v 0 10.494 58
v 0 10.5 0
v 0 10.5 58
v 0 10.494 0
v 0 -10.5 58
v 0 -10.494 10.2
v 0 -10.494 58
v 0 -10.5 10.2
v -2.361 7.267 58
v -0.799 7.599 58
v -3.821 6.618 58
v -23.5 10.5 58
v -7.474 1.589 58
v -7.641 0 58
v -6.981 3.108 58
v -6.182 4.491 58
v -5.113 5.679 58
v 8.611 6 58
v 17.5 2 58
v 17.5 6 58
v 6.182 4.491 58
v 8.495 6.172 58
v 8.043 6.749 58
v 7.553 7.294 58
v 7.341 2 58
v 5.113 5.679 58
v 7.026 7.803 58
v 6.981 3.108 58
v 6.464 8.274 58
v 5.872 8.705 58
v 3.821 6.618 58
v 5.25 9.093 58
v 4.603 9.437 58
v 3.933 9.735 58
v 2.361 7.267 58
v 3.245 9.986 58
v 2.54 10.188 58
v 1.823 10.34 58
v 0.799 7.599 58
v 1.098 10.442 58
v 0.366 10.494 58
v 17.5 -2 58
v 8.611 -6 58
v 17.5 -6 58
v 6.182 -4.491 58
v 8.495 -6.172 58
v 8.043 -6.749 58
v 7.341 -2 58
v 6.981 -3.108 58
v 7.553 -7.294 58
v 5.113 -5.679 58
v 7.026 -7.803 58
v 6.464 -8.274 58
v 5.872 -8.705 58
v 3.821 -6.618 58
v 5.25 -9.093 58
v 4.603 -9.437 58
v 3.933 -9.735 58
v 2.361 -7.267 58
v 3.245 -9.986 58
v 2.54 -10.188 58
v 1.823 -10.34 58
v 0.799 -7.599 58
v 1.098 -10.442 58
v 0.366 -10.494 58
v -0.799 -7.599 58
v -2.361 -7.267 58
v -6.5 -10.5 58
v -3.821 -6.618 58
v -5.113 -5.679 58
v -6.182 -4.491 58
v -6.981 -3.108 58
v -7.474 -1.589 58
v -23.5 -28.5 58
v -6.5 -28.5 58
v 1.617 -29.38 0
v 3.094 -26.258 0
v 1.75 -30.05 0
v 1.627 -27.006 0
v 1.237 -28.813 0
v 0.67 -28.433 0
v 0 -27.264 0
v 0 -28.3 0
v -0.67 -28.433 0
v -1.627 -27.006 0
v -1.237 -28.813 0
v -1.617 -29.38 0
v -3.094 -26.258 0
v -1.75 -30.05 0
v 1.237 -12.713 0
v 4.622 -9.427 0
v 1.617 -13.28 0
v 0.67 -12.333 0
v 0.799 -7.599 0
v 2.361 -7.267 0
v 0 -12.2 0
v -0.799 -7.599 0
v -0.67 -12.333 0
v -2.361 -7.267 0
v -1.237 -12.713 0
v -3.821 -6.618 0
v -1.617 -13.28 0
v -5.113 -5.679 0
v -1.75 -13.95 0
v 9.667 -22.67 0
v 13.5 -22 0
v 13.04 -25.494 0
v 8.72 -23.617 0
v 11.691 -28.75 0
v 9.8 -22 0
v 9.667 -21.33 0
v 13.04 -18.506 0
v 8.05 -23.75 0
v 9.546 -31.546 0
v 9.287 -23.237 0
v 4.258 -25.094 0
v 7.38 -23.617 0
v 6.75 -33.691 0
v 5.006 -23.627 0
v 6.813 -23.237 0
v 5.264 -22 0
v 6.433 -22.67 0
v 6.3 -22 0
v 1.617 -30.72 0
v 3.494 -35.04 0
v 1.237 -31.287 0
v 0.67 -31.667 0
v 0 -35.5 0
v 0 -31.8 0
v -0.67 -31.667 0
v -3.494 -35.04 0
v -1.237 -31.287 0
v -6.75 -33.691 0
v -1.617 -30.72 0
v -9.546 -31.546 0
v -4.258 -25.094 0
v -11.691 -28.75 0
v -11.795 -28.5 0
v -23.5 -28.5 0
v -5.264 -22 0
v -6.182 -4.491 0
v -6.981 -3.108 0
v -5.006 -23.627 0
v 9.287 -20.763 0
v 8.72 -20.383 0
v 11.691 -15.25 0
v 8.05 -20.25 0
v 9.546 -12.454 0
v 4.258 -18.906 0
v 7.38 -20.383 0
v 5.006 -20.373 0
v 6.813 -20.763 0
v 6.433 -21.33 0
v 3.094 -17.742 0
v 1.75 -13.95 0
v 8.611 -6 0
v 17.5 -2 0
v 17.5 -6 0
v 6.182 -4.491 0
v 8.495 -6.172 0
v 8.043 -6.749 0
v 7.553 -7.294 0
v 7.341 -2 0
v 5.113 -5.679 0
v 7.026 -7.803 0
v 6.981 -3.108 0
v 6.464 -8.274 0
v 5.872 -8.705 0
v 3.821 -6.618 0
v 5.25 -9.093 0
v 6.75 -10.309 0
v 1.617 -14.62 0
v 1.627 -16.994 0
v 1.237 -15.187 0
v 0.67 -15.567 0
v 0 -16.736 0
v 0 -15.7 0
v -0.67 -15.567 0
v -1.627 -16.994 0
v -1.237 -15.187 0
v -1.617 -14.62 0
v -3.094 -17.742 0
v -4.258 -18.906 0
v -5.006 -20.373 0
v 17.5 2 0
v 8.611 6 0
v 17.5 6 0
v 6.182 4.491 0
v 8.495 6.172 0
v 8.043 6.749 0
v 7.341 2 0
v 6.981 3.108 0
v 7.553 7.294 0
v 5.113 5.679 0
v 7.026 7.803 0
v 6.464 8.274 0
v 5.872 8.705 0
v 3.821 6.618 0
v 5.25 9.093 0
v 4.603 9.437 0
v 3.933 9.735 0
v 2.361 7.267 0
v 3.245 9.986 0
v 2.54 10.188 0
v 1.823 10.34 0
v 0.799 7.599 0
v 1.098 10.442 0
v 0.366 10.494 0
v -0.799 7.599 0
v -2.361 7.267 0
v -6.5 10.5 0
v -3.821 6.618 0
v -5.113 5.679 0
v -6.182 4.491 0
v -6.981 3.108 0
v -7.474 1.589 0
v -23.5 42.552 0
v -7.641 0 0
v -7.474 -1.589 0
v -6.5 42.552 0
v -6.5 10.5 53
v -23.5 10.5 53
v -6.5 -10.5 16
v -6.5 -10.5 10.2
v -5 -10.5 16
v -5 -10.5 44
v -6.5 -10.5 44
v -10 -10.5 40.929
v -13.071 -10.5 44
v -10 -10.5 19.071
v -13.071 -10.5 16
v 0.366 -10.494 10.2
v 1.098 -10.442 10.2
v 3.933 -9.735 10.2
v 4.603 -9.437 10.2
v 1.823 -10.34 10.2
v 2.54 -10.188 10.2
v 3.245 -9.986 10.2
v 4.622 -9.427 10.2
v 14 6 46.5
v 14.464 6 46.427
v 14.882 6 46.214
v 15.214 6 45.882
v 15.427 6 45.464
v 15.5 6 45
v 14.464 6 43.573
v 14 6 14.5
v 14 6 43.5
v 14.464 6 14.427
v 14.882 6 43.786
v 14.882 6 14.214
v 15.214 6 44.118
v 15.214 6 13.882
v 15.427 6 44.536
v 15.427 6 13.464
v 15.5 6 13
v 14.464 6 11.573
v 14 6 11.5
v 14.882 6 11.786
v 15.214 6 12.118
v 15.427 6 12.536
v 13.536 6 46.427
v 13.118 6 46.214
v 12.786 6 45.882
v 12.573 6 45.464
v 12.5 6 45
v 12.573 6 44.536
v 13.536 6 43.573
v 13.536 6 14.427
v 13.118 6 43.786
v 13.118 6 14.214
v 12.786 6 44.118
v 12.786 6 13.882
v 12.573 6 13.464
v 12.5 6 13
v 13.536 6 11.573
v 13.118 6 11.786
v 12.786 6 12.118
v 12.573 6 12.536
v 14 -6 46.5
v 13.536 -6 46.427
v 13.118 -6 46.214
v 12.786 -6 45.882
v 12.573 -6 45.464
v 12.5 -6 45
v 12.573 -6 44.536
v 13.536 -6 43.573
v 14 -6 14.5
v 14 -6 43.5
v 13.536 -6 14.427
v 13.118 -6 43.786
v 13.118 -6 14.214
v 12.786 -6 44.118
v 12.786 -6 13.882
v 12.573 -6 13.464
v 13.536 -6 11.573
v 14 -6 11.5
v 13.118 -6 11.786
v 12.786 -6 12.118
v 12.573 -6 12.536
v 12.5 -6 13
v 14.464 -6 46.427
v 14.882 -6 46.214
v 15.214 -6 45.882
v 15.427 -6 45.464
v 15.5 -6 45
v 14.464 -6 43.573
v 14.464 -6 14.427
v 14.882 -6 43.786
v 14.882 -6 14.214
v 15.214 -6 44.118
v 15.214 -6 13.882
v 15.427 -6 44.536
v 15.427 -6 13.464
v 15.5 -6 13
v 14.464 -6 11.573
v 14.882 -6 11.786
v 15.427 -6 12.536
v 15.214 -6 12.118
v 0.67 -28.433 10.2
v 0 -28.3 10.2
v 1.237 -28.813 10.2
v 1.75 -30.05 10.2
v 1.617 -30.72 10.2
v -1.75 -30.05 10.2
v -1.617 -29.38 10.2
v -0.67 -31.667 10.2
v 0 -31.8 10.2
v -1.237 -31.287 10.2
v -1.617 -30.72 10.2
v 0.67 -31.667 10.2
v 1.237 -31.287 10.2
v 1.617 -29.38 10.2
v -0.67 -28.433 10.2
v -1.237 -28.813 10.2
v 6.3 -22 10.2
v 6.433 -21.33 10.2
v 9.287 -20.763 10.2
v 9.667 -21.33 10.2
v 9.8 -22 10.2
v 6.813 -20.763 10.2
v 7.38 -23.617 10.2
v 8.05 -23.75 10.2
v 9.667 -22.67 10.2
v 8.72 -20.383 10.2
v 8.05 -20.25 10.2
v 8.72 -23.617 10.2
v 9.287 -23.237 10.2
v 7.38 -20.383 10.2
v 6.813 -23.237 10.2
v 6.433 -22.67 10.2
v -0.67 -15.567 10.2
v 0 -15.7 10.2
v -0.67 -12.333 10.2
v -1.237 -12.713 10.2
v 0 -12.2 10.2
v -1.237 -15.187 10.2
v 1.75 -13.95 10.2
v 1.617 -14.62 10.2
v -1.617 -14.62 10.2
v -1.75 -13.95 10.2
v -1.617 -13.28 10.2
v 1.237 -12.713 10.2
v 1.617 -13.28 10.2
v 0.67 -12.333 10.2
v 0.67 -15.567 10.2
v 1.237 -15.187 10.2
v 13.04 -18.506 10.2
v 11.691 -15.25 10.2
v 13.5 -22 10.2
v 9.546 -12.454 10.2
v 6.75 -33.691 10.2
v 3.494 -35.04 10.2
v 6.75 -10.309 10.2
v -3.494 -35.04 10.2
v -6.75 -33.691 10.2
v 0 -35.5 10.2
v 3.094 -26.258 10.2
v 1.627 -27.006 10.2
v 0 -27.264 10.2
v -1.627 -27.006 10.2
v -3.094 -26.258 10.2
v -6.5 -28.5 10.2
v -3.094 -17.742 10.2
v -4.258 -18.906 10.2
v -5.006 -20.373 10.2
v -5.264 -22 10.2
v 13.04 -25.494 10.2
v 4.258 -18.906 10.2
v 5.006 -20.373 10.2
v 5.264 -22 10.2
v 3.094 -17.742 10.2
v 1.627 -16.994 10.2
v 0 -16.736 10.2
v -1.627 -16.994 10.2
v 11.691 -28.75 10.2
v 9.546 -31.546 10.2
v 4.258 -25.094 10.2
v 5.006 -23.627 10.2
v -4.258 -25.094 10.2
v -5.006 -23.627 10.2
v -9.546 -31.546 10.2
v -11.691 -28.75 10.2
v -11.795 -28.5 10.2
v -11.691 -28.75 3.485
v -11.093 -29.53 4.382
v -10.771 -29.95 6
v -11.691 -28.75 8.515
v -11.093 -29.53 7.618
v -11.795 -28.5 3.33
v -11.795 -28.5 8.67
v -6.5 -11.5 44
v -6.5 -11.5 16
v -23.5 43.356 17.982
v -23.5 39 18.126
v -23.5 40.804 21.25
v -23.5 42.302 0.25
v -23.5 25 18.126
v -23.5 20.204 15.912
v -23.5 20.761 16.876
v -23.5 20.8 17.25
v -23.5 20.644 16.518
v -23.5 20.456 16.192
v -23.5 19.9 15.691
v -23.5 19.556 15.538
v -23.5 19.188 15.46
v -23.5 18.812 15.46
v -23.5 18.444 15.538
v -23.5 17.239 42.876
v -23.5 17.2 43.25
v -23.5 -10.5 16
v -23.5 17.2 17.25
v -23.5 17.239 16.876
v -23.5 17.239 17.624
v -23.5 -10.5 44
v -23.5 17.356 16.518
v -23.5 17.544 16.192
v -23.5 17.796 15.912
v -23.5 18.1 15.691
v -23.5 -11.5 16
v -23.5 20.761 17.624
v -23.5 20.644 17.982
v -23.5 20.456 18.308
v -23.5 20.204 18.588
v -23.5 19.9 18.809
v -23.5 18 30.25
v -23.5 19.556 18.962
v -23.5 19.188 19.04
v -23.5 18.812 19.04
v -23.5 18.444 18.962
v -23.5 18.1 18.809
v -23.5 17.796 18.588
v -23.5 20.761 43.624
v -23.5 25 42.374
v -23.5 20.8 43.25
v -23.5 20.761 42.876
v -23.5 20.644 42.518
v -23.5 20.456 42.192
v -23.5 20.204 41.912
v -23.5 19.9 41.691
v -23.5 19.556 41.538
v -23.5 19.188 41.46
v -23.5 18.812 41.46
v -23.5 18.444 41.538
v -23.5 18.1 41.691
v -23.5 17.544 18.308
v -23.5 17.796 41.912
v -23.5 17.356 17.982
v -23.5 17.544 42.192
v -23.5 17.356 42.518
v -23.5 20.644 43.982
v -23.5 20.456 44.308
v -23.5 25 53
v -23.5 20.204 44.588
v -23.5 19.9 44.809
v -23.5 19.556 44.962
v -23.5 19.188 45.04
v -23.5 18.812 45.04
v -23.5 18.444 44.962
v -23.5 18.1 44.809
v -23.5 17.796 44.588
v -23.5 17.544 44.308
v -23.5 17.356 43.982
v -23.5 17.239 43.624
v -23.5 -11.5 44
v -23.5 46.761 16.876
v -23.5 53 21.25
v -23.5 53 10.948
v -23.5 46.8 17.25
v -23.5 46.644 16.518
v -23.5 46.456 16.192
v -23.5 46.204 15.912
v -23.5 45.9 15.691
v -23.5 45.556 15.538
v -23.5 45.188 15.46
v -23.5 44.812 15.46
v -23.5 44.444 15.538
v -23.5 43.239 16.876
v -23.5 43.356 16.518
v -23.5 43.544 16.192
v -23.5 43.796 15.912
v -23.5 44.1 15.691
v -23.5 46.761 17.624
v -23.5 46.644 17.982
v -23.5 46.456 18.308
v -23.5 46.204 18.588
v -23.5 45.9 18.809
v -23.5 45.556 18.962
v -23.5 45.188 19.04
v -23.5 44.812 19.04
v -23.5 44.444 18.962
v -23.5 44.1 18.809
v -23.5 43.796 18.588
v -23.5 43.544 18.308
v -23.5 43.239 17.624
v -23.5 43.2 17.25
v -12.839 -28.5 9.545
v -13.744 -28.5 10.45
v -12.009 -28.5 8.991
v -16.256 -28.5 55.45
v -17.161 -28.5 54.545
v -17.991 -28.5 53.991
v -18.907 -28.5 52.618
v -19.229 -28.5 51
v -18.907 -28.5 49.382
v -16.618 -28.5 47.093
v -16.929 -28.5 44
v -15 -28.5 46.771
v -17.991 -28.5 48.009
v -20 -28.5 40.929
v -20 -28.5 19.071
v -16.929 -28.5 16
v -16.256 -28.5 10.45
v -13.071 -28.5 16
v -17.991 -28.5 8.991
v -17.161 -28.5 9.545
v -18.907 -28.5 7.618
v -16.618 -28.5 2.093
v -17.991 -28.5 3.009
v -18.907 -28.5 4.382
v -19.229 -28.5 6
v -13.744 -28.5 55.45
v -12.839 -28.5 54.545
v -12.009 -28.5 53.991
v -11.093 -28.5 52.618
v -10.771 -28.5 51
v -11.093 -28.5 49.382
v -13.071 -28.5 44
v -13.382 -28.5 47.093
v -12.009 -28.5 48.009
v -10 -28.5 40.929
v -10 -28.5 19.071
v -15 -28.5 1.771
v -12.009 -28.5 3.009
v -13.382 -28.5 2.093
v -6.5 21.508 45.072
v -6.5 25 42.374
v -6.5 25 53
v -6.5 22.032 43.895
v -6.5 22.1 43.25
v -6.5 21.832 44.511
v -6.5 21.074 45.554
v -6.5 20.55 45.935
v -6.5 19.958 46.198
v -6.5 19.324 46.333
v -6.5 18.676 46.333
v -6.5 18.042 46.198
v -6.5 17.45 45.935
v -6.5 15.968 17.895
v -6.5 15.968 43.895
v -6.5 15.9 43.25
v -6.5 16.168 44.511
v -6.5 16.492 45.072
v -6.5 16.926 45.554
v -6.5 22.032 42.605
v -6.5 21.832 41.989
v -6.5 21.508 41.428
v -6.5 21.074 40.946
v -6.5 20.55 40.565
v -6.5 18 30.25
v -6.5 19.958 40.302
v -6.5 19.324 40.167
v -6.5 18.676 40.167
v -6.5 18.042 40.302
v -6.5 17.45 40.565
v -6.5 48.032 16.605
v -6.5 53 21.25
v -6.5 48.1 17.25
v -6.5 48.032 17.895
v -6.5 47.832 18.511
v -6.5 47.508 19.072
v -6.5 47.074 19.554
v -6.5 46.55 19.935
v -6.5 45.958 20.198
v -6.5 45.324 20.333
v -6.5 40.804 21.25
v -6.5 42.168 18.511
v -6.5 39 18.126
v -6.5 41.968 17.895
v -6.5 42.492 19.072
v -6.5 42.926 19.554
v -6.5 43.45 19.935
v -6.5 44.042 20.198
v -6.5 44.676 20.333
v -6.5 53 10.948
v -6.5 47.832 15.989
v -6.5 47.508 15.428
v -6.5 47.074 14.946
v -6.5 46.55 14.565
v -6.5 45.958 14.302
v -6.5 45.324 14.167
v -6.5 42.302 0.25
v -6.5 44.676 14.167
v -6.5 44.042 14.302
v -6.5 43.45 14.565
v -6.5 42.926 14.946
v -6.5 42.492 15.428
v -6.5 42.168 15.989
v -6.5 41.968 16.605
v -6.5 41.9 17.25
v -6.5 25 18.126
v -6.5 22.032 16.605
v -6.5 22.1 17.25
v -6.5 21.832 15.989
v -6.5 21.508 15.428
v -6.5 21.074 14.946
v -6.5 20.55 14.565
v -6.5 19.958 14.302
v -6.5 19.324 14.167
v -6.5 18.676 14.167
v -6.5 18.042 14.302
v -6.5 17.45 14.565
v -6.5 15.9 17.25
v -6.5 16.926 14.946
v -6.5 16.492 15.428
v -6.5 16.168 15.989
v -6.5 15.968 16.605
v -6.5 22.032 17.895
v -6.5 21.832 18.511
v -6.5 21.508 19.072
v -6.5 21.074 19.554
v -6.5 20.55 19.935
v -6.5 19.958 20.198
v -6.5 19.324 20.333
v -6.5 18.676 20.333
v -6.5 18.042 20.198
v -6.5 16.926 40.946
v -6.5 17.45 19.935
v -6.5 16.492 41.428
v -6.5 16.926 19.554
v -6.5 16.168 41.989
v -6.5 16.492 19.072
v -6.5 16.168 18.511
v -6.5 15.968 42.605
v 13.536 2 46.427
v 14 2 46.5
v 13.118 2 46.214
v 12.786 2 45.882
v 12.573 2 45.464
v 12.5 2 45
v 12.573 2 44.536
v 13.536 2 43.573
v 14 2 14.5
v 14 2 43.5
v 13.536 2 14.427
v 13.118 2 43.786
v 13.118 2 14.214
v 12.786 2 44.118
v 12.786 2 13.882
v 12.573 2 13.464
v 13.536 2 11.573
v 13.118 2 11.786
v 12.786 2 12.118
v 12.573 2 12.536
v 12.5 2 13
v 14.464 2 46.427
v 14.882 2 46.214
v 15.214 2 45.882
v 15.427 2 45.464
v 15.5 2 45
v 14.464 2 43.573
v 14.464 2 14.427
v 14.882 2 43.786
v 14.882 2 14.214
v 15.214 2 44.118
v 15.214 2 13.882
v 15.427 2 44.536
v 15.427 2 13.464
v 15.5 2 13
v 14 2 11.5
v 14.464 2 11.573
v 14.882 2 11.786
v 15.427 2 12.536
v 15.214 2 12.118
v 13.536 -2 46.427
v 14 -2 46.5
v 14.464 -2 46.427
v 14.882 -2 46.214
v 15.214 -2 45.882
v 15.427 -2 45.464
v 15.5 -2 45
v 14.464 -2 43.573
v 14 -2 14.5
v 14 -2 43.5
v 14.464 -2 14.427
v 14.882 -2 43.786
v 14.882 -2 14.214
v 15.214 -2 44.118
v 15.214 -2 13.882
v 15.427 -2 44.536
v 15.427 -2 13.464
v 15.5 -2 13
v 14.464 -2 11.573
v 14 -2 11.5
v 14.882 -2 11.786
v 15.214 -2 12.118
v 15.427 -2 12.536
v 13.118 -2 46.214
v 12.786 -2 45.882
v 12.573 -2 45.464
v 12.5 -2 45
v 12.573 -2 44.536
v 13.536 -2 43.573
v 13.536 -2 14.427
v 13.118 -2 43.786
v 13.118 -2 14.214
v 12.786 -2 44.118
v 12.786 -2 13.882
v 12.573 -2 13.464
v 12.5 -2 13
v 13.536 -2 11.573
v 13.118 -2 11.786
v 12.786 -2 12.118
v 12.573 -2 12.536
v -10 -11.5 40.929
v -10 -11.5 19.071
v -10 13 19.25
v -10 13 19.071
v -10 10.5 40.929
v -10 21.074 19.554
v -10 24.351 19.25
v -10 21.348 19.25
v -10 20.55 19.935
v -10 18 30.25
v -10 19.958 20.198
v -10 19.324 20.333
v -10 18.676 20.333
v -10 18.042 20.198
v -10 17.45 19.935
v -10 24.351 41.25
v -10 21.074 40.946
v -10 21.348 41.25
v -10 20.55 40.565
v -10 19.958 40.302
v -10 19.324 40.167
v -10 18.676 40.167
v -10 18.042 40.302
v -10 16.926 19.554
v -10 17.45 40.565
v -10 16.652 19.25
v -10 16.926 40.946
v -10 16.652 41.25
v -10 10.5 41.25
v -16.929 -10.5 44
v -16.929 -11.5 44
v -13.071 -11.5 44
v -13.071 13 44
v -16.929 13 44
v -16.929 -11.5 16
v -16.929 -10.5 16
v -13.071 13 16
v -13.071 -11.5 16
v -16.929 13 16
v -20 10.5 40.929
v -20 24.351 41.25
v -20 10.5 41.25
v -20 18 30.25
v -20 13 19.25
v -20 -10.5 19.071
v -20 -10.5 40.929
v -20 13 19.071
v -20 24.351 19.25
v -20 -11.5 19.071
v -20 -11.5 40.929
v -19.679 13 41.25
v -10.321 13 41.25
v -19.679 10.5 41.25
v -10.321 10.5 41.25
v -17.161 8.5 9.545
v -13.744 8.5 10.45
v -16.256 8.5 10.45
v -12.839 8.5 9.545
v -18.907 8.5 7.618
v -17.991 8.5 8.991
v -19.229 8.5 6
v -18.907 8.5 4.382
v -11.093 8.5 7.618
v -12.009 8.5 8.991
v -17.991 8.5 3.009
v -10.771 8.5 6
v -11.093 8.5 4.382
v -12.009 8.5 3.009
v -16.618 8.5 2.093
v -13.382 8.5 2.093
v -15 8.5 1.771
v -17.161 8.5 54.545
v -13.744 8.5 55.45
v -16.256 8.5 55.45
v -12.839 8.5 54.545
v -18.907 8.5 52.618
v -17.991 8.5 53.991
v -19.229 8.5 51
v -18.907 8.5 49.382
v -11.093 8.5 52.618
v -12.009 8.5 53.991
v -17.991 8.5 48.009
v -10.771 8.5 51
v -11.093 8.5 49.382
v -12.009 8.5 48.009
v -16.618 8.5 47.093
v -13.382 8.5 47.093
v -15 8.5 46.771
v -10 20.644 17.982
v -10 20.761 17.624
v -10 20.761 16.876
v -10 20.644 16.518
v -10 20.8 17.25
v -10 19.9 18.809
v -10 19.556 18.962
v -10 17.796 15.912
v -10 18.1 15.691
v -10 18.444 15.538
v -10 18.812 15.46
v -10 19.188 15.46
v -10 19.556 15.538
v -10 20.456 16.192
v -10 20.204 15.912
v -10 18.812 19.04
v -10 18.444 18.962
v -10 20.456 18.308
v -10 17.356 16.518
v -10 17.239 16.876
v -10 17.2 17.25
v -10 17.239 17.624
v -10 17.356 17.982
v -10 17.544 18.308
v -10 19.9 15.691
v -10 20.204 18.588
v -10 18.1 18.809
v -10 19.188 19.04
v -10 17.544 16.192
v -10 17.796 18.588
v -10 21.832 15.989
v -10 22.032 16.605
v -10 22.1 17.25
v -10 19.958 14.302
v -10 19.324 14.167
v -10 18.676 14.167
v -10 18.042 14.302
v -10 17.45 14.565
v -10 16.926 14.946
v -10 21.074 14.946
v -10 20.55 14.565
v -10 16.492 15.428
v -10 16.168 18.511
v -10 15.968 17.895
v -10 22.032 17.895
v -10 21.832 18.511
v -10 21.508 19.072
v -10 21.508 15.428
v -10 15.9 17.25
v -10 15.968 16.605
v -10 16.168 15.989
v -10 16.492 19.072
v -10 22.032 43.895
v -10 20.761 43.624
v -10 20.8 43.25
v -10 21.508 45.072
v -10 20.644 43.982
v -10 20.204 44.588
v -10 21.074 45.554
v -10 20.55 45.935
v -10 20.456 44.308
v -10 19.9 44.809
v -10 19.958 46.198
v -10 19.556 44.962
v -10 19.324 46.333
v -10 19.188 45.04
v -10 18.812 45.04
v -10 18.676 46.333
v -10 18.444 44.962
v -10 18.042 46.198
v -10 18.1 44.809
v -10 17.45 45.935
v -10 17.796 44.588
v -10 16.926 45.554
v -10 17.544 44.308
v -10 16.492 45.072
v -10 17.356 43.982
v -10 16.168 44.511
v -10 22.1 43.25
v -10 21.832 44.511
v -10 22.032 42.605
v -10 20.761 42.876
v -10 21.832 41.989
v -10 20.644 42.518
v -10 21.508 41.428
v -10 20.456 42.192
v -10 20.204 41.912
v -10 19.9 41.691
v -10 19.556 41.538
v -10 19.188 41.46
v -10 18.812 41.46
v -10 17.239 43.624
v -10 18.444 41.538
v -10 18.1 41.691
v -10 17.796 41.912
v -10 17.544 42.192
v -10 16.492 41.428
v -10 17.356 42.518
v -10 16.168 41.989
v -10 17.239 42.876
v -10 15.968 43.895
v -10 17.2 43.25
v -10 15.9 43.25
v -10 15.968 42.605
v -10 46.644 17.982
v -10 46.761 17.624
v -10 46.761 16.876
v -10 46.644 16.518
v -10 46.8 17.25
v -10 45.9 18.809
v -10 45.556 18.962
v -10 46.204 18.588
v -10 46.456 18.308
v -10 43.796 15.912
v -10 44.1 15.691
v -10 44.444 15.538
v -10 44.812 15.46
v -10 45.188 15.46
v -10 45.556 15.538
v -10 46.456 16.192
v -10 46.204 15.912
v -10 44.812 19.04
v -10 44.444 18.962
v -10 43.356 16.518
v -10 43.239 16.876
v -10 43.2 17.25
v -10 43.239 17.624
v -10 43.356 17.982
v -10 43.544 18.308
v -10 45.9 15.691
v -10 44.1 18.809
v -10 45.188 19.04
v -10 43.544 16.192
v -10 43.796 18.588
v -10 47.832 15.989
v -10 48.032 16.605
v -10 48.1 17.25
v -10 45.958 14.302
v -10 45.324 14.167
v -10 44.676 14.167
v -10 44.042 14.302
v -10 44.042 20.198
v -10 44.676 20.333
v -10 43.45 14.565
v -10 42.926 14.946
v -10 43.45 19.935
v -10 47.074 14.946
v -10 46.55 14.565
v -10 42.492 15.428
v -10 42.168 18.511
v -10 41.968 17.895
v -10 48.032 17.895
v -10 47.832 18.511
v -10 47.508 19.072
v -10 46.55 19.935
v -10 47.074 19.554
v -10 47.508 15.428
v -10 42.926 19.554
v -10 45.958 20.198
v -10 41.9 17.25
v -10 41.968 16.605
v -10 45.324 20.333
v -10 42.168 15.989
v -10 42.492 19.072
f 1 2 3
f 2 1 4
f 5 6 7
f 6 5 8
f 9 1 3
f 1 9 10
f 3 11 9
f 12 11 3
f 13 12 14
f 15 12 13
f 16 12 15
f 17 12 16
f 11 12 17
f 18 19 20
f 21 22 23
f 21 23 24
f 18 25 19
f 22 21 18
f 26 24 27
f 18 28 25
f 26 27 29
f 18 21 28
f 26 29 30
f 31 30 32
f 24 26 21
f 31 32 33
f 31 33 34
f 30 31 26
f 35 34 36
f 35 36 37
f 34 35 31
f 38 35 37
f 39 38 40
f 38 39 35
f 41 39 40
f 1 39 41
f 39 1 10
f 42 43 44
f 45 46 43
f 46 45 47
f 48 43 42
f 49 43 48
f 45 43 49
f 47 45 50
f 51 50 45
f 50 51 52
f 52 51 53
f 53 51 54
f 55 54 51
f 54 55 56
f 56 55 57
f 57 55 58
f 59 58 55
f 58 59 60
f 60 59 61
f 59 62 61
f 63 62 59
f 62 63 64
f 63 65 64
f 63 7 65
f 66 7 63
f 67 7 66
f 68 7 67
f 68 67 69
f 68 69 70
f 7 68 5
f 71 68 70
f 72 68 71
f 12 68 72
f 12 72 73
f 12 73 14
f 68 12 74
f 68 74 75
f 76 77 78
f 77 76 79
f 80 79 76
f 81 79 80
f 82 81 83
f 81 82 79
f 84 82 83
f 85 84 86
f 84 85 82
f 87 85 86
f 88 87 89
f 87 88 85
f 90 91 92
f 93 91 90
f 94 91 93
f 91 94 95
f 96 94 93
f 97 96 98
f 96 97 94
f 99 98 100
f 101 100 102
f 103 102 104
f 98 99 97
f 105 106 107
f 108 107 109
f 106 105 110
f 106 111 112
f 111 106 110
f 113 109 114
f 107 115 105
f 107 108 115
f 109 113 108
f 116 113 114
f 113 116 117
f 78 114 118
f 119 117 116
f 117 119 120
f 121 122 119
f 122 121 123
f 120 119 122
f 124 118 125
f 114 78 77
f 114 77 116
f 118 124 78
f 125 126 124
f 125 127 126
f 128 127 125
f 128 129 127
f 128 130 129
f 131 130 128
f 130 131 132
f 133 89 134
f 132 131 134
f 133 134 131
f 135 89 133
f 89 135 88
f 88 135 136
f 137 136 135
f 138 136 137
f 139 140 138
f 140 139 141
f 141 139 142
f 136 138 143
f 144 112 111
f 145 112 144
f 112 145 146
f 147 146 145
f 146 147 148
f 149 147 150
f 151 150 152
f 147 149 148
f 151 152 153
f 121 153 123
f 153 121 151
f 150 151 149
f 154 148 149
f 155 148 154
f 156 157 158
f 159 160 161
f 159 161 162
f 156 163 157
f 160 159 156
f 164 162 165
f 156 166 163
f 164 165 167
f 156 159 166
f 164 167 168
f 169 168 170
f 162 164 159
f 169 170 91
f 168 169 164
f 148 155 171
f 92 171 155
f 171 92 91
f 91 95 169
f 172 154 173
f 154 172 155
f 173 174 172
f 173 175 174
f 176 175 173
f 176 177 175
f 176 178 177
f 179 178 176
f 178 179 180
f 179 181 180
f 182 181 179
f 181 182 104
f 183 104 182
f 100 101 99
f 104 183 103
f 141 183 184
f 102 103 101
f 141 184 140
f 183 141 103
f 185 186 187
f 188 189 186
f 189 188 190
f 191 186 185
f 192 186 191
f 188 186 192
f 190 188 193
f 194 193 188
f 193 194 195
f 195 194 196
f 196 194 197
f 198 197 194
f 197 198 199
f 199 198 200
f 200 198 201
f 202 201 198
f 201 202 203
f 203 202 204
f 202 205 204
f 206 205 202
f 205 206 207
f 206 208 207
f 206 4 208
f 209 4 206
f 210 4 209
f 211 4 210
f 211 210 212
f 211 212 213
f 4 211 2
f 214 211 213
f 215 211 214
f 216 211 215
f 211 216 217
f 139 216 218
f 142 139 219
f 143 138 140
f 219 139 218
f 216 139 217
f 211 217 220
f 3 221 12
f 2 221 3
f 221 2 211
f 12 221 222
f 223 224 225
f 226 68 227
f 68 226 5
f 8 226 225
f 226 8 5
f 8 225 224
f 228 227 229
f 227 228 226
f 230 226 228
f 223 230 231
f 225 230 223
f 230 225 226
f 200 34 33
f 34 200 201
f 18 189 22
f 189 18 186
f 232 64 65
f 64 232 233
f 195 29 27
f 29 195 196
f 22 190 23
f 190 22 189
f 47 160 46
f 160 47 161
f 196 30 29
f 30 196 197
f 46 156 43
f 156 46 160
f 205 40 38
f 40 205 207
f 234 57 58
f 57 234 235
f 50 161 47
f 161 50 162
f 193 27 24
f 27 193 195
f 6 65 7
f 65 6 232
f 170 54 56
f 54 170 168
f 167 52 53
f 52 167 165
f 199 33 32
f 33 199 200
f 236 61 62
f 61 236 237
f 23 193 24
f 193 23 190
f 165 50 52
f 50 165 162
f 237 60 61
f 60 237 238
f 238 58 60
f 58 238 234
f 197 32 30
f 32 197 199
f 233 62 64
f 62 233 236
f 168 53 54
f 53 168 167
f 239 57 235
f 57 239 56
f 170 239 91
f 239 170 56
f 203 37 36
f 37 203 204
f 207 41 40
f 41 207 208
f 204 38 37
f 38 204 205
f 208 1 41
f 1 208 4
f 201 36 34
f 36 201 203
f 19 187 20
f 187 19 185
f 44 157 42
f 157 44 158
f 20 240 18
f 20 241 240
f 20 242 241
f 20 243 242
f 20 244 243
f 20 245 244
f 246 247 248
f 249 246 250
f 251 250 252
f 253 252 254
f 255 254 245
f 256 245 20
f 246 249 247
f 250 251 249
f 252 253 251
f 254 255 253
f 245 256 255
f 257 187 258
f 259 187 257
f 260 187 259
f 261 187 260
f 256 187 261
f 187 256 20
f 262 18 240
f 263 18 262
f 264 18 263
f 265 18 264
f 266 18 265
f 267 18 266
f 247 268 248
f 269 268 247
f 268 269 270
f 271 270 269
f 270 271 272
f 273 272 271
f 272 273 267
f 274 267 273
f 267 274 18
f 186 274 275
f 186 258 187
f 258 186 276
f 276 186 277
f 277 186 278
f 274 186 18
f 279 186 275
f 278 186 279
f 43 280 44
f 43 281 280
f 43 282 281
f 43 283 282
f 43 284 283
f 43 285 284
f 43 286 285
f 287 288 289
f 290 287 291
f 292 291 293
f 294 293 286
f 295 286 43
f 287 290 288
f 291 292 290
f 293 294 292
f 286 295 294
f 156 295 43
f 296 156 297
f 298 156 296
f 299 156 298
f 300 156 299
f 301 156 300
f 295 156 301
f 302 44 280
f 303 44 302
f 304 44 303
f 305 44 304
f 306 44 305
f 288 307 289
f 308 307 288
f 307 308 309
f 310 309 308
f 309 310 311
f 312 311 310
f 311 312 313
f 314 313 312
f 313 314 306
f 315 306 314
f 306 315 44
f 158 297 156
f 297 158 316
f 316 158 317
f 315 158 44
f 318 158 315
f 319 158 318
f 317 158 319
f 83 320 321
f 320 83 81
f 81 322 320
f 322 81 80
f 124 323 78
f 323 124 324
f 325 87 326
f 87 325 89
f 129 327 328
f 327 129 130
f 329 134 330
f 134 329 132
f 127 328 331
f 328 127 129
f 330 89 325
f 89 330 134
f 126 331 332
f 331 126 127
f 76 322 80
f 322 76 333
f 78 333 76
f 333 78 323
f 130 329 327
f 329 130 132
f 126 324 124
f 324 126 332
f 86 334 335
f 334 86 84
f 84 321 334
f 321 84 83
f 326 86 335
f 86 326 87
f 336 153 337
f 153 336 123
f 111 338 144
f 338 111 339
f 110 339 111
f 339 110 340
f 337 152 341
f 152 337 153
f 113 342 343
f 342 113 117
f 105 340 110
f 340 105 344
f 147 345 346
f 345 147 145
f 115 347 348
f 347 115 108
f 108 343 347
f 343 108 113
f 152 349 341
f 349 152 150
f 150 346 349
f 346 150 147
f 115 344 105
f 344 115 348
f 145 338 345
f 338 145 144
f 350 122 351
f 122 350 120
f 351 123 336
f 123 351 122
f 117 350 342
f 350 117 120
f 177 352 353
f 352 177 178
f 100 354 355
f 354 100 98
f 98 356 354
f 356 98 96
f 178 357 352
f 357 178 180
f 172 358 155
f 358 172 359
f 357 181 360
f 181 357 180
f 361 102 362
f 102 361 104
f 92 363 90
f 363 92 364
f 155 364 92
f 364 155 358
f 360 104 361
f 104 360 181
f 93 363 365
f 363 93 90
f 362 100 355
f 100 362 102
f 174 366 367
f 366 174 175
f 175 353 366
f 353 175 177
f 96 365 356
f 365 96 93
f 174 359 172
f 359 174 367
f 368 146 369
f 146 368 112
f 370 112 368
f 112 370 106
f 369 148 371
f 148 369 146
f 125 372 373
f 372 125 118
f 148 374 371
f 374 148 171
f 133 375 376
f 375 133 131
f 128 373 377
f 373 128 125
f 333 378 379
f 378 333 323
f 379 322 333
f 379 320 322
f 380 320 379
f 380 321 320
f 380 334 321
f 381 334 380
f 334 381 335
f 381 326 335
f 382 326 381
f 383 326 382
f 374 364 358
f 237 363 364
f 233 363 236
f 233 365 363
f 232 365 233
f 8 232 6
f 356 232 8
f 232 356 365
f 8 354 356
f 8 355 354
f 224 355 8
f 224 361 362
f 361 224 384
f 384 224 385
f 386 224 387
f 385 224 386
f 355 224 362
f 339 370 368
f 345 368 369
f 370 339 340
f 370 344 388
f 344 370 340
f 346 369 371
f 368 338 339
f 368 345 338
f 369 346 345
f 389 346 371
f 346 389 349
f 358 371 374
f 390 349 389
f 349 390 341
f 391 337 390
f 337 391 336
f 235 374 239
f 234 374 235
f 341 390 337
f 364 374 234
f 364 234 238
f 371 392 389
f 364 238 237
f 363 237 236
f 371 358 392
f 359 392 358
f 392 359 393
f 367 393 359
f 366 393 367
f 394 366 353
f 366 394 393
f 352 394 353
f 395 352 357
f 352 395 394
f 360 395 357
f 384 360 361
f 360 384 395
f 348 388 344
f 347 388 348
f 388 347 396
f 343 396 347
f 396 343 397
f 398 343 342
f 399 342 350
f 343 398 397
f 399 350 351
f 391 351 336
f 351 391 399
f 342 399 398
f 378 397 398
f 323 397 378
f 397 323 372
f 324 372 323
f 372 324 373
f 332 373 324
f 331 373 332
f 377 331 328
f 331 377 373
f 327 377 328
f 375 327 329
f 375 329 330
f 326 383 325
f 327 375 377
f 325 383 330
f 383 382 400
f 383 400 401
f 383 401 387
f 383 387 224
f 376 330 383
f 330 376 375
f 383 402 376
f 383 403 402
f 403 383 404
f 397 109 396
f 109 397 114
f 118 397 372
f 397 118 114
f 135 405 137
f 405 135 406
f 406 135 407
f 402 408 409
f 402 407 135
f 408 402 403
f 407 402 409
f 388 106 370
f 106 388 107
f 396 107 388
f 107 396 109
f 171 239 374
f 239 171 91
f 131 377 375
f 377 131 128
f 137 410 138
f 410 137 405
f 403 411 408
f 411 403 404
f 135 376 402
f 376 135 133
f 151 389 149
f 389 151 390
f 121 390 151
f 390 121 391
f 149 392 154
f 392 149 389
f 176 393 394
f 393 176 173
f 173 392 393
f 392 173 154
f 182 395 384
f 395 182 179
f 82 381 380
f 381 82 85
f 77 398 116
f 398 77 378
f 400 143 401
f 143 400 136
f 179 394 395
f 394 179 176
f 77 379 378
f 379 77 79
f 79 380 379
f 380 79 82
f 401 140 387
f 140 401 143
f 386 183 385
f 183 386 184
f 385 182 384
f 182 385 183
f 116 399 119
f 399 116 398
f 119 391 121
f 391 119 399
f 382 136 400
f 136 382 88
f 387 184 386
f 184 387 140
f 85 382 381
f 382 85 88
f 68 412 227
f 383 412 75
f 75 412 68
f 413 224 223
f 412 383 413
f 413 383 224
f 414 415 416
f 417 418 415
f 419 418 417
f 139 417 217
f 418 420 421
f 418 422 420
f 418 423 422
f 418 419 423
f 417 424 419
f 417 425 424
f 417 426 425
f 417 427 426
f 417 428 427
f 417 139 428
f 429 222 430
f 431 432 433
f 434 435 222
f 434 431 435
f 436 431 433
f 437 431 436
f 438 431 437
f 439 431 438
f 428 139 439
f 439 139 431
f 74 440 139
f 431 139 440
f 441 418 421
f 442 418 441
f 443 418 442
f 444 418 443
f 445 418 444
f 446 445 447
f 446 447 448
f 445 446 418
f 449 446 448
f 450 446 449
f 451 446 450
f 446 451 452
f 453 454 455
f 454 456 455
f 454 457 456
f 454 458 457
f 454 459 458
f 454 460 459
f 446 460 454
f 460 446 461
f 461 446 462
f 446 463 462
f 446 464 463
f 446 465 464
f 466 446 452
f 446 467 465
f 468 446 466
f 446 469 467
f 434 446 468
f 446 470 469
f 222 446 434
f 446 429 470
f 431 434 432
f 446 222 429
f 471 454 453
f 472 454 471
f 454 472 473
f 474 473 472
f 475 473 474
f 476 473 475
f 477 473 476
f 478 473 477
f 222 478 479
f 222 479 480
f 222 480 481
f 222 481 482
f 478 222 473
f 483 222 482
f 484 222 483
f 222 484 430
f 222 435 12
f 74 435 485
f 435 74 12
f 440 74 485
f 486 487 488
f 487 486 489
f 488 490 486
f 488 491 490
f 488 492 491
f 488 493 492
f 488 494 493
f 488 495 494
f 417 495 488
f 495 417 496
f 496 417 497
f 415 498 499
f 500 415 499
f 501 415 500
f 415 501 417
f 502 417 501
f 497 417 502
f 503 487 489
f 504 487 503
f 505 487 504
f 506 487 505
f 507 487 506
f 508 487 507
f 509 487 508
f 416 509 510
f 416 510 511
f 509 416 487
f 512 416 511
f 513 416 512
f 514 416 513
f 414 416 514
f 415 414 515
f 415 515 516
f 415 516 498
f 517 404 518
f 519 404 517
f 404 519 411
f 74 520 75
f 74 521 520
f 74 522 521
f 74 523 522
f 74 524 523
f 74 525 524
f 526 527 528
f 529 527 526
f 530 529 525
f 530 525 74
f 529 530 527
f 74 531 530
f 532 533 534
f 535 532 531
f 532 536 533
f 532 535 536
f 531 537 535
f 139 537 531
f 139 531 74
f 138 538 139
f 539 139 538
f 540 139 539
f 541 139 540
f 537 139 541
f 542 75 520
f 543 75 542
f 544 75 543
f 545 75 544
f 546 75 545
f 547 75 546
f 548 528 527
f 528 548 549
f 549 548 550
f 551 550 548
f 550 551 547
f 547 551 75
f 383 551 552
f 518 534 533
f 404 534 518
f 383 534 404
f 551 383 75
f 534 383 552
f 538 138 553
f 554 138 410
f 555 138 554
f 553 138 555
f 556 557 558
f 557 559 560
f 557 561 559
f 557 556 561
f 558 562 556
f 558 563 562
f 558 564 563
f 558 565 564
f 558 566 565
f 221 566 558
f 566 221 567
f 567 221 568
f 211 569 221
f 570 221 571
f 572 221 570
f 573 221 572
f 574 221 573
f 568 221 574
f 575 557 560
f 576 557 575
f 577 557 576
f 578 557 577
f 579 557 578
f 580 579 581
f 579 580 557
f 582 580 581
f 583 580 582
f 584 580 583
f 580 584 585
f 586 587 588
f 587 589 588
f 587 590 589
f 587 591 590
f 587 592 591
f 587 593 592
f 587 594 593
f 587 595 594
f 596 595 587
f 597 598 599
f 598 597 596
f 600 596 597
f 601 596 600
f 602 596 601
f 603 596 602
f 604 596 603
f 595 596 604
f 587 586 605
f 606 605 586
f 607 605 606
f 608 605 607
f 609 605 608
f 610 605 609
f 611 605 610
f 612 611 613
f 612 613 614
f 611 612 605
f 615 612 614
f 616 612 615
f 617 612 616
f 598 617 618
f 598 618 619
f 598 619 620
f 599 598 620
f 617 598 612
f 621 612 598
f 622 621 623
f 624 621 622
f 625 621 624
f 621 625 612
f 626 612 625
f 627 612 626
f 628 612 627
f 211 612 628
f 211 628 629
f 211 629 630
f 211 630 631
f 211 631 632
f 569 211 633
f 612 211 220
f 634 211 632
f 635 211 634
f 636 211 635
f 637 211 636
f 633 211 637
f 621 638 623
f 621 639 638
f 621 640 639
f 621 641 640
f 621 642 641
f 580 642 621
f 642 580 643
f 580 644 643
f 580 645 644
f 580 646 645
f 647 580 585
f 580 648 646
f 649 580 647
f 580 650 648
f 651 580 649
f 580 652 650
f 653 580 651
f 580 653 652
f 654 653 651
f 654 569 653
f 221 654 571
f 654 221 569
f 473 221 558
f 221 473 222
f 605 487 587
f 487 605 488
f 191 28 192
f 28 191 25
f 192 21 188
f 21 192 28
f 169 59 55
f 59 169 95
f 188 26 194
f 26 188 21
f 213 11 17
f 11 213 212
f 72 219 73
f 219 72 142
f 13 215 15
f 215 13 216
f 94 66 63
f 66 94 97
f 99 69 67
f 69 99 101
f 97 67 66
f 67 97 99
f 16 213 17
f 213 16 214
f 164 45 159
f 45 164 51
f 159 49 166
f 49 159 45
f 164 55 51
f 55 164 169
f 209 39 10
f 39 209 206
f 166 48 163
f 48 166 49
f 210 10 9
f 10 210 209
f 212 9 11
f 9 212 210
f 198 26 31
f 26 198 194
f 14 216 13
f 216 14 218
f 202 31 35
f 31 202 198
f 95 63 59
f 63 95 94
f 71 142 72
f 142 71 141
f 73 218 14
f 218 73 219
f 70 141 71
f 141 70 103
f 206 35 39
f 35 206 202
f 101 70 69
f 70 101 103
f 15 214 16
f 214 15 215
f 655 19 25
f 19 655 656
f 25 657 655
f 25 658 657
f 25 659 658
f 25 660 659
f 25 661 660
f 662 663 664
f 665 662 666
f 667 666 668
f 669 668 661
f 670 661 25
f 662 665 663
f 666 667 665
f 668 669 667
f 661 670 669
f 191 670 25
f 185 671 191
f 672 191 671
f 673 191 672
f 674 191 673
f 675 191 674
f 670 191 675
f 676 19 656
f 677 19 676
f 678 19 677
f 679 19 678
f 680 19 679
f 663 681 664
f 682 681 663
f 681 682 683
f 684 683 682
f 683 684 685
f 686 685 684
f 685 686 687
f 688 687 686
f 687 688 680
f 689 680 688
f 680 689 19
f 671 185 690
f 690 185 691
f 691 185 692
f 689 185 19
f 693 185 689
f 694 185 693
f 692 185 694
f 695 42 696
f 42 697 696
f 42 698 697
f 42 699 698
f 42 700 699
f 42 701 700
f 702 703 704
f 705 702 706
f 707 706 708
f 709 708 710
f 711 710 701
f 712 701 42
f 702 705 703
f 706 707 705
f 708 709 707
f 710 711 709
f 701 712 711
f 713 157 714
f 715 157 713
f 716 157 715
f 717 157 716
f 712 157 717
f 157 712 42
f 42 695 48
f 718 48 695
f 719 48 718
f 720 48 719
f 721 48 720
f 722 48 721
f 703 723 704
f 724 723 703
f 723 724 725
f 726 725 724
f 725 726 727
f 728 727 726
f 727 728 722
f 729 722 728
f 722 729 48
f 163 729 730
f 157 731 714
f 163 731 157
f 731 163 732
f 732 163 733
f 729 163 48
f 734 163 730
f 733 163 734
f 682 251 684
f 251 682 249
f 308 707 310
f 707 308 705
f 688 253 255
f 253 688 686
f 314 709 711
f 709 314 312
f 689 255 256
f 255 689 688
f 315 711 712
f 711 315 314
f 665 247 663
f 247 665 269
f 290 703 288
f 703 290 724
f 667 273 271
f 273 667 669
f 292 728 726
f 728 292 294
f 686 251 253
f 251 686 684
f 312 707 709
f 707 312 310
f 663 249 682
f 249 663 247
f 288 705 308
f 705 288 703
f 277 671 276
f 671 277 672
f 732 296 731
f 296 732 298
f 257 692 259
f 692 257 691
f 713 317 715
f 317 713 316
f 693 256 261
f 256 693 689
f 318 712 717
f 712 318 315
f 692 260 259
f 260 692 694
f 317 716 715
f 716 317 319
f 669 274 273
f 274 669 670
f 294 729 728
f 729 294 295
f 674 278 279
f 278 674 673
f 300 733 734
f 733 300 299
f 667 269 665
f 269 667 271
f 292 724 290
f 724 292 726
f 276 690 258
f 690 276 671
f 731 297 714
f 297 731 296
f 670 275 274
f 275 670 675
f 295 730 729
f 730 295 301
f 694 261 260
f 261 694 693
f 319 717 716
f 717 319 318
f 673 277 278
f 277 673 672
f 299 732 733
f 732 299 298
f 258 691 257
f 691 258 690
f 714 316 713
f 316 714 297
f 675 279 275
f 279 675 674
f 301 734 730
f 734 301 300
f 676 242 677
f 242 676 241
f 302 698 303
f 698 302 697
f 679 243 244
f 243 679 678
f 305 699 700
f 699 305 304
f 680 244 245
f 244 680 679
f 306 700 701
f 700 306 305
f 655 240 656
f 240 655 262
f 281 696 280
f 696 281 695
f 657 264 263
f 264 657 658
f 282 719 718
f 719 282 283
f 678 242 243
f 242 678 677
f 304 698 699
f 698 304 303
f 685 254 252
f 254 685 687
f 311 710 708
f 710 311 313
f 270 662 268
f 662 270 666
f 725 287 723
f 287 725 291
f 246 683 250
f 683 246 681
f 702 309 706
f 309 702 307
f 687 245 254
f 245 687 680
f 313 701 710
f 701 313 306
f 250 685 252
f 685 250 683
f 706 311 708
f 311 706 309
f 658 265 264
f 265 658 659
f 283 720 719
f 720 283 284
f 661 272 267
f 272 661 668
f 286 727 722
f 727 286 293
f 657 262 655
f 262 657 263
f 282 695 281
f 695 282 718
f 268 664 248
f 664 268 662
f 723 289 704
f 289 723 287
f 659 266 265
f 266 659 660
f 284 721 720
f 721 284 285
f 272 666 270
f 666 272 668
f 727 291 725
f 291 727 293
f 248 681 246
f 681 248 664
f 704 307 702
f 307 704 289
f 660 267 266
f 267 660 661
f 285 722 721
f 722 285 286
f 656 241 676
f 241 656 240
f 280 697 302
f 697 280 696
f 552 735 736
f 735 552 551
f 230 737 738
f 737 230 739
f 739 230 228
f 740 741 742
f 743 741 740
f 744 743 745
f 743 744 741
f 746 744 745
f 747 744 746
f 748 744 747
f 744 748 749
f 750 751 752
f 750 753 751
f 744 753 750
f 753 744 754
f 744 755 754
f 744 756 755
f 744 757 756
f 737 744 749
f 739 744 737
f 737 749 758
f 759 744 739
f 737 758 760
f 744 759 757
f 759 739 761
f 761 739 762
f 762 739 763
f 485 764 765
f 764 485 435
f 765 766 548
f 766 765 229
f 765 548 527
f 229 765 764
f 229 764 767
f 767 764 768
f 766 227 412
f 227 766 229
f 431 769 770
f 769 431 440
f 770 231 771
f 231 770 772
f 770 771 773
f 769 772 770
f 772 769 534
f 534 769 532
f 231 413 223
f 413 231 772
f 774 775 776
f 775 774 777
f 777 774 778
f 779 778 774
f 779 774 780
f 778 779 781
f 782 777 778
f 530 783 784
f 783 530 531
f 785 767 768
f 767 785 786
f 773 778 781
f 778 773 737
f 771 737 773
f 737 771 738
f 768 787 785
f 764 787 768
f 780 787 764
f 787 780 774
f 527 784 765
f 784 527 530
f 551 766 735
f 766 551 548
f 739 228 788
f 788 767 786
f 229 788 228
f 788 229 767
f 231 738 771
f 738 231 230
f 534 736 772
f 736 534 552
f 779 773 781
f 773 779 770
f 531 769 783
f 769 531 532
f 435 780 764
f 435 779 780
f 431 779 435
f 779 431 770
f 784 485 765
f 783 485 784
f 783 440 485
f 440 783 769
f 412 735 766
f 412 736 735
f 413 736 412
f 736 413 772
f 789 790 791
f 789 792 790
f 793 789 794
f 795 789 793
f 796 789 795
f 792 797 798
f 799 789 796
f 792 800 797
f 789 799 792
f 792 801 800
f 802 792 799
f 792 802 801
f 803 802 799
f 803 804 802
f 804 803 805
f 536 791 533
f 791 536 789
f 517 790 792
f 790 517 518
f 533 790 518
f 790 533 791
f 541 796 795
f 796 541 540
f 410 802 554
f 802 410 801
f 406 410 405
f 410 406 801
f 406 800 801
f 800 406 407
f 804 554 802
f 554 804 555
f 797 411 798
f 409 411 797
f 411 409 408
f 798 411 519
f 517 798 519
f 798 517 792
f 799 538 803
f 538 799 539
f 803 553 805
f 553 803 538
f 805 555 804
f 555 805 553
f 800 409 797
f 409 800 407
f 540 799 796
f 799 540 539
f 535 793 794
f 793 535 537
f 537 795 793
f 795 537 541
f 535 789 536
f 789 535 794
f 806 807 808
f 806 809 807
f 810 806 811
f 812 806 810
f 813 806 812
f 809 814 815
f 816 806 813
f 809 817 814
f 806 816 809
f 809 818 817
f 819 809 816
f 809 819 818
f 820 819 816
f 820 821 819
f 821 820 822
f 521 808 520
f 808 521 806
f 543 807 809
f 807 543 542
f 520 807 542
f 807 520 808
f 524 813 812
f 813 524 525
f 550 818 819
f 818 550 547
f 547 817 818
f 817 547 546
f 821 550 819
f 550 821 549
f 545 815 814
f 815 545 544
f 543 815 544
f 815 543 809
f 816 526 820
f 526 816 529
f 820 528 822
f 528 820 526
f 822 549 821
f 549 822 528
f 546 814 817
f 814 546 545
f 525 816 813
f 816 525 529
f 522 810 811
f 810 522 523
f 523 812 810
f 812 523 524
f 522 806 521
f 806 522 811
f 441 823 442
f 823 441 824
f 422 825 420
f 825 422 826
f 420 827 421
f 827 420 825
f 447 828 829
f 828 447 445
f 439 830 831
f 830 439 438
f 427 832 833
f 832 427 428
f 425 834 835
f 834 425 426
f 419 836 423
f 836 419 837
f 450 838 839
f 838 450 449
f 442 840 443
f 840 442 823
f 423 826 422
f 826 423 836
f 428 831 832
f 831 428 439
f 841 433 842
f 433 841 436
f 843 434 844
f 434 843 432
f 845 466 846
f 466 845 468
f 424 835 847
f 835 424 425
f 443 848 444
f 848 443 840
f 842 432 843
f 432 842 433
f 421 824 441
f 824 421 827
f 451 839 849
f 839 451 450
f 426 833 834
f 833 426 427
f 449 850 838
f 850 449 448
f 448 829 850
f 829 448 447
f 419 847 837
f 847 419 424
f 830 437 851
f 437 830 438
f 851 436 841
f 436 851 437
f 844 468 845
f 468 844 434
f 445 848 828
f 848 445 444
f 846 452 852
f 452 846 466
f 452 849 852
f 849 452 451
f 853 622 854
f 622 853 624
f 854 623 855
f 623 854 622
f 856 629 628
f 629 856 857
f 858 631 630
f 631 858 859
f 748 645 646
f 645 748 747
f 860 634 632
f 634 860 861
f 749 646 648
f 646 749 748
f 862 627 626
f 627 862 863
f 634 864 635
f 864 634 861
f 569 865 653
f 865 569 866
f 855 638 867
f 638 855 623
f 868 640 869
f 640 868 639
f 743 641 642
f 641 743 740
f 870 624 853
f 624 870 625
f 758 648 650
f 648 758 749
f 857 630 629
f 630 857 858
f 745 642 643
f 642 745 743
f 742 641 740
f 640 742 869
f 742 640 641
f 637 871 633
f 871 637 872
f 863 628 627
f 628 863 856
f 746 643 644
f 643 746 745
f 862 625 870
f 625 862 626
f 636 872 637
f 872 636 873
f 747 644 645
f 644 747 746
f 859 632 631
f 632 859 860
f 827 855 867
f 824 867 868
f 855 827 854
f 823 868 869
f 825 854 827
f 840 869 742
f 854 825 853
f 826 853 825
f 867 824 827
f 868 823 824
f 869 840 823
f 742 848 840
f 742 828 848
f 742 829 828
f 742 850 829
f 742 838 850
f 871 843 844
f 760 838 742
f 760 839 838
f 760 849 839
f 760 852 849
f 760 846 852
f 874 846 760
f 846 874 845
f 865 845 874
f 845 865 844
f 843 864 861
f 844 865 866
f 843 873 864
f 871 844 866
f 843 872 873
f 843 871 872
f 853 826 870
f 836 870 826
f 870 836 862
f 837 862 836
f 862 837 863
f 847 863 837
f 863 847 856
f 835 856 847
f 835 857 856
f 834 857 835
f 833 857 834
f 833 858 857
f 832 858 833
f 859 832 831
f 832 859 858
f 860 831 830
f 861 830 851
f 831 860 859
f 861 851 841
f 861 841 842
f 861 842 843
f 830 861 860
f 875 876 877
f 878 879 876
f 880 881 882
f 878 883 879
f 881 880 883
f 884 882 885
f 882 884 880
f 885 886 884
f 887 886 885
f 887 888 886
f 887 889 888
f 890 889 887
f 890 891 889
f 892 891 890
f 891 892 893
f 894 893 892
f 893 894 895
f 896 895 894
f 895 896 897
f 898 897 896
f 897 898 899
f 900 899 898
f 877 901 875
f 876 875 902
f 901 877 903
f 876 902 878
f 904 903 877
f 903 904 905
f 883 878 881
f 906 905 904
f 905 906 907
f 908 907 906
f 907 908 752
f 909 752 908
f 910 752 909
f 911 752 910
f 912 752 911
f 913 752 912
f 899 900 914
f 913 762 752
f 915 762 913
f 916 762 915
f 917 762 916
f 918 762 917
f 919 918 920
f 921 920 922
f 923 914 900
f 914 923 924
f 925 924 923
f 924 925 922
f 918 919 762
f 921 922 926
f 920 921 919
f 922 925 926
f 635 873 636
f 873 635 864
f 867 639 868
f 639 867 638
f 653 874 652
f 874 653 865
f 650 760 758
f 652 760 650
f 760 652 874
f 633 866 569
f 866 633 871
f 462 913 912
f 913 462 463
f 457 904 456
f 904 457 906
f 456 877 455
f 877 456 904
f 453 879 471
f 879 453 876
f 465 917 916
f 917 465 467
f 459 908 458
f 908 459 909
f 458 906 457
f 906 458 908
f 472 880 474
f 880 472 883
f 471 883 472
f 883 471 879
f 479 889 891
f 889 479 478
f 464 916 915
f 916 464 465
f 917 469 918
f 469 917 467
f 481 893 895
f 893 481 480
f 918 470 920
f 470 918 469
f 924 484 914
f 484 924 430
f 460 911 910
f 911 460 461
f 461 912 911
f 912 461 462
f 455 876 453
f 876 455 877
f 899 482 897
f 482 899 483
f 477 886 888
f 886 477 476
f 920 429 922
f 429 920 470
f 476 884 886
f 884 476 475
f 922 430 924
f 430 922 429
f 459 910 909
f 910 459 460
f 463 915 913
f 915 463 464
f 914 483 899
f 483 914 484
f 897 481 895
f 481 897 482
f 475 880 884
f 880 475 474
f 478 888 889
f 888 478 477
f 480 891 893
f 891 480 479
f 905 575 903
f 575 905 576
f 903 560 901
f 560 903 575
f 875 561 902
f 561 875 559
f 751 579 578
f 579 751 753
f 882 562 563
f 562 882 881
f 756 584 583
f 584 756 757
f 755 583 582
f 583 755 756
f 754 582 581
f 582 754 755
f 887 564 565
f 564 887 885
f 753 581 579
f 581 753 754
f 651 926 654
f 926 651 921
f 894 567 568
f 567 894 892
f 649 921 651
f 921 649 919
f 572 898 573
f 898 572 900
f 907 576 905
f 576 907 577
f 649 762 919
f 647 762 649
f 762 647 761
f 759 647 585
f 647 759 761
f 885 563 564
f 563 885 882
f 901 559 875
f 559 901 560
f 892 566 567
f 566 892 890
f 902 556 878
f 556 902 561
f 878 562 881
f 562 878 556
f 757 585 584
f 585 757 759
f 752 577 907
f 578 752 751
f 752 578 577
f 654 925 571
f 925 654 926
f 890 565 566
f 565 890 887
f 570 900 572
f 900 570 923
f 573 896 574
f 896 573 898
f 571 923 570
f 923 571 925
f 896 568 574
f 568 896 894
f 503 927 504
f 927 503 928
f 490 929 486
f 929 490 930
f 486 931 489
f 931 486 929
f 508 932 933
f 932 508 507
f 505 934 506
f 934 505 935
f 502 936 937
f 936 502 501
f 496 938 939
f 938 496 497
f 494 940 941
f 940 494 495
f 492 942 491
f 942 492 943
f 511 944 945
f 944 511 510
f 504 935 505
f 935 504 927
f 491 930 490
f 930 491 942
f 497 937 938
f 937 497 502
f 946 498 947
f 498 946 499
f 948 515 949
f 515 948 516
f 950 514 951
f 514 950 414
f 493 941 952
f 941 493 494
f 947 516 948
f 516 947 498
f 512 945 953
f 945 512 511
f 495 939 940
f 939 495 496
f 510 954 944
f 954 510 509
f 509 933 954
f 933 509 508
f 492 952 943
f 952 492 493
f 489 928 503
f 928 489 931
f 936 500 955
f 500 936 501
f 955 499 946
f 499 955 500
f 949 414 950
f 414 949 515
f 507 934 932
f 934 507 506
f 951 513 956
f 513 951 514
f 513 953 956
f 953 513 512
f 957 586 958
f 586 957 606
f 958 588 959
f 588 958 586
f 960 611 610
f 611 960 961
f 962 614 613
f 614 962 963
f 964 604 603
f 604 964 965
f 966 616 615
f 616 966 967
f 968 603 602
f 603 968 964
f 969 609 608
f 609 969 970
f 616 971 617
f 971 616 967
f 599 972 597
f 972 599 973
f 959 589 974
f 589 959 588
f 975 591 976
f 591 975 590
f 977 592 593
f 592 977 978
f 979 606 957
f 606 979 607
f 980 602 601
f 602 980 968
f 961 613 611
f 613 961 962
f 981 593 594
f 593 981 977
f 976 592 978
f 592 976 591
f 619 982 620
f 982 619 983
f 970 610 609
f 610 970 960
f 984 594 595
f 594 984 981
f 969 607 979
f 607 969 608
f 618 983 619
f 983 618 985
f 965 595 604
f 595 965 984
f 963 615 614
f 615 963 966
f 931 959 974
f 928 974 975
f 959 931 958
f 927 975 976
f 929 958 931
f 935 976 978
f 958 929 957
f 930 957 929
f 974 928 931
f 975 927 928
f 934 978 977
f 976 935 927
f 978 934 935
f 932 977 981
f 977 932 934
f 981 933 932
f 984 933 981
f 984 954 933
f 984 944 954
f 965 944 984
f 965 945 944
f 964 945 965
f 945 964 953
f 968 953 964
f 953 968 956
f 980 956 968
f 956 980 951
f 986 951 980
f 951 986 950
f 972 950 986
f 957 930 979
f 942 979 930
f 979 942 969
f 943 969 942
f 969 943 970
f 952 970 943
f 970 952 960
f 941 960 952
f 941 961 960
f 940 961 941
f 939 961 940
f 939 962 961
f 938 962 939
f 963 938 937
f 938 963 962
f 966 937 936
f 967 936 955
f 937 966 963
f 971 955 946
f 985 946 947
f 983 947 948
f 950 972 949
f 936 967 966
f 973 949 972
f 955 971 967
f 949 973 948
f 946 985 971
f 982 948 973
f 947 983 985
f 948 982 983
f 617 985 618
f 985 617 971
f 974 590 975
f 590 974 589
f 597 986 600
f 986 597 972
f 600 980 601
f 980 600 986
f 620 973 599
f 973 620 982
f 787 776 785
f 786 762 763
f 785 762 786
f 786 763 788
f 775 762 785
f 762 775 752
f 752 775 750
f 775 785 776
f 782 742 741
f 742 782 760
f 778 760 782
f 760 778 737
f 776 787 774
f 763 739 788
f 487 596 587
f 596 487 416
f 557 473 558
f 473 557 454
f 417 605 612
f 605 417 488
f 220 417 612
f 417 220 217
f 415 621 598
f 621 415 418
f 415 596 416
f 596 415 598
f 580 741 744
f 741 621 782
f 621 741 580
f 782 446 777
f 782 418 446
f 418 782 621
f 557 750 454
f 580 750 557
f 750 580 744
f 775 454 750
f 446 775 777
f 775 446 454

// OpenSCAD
// file: polyholes.scad
//
// Mendel90
//
// GNU GPL v2
// nop.head@gmail.com
// hydraraptor.blogspot.com
//
// See http://hydraraptor.blogspot.com/2011/02/polyholes.html
//
function sides(r)=max(round(4 *r),3);
function correctedRadius(r,n)=0.1 + r / cos(180 / n);
function correctedDiameter(d)=0.2 + d / cos(180 / sides(d / 2));

module polyCircle(r, center=false) {
    n=sides(r);
    circle(r=correctedRadius(r,n), $fn=n, center=center);
}

module poly_circle(r, center=false) {
	polyCircle(r, center);
}

module polyCylinder(r, h, center=false) {
    n=sides(r);
    cylinder(h=h, r=correctedRadius(r,n), $fn=n, center=center);
}

module poly_cylinder(r, h, center=false) {
	polyCylinder(r,h,center);
}

module polydCylinder(r, center=false) {
    n=sides(r);
    r=correctedRadius(r,n);
    cylinder(h=h, r=r, $fn=n, center=center);
    translate([0, -r, 0])
        cube([r, 2 * r, h]);
}

module poly_d_cylinder(r, center=false) {
	polydCylinder(r,center);
}
// file: bearing.scad
// PRUSA iteration3
// Bearing holders
// GNU GPL v3
// Josef Průša <iam@josefprusa.cz> and contributors
// http://www.reprap.org/wiki/Prusa_Mendel
// http://prusamendel.org

use <polyholes.scad>

bearing_diameter = 15;

module horizontal_bearing_base(bearings=1){
 translate(v=[0,0,6]) cube(size = [24,8+bearings*25,12], center = true);	
}
module horizontal_bearing_holes(bearings=1){
 cutter_lenght = 10+bearings*25;
 one_holder_lenght = 8+25;
 holder_lenght = 8+bearings*25;
 
 // Main bearing cut
 difference(){
  translate(v=[0,0,12]) rotate(a=[90,0,0]) translate(v=[0,0,-cutter_lenght/2]) cylinder(h = cutter_lenght, r=bearing_diameter/2, $fn=50);
  // Bearing retainers
  translate(v=[0,1-holder_lenght/2,3]) cube(size = [24,6,8], center = true);
  translate(v=[0,-1+holder_lenght/2,3]) cube(size = [24,6,8], center = true);
 }
 
 // Ziptie cutouts
 ziptie_cut_ofset = 0;
 for ( i = [0 : bearings-1] ){
  // For easier positioning I move them by half of one 
  // bearing holder then add each bearign lenght and then center again
  translate(v=[0,-holder_lenght/2,0]) translate(v=[0,one_holder_lenght/2+i*25,0]) difference(){
   union(){
    translate(v=[0,2-6,12]) rotate(a=[90,0,0]) translate(v=[0,0,0]) cylinder(h = 4, r=12.5, $fn=50);
    translate(v=[0,2+6,12]) rotate(a=[90,0,0]) translate(v=[0,0,0]) cylinder(h = 4, r=12.5, $fn=50);
   }
   translate(v=[0,10,12]) rotate(a=[90,0,0]) translate(v=[0,0,0]) cylinder(h = 24, r=10, $fn=50);
  }
 }
 
}

module horizontal_bearing_test(){
 difference(){
  horizontal_bearing_base(1);
  horizontal_bearing_holes(1);
 }
 translate(v=[30,0,0]) difference(){
  horizontal_bearing_base(2);
  horizontal_bearing_holes(2);
 }
 translate(v=[60,0,0]) difference(){
  horizontal_bearing_base(3);
  horizontal_bearing_holes(3);
 }
}



thinwall = 3;
bearing_size = bearing_diameter + 2 * thinwall;

module vertical_bearing_base(){
 translate(v=[-2-bearing_size/4,0,29]) cube(size = [4+bearing_size/2,bearing_size,58], center = true);
 cylinder(h = 58, r=bearing_size/2, $fn = 90);
 translate(v=[(bearing_size/2)+2,0,29]) cube([10,12,58], center=true);
}

module vertical_bearing_holes(){
  height = 58;
  translate(v=[0,0,-1]) poly_cylinder(h = height+2, r=bearing_diameter/2);
  // translate(v=[0,0,24]) poly_cylinder(h = height-(24*2), r=bearing_diameter/2);
  translate(v=[bearing_diameter/2-1,-4/2,-1]) cube(size = [(thinwall*2)+8,4,62]);
  rotate([90,0,0]) translate([14,13,0]) cylinder(d=3, h=15, center=true, $fn = 20);
  rotate([90,0,0]) translate([14,height-13,0]) cylinder(d=3, h=15, center=true, $fn = 20);
}

difference(){
  vertical_bearing_base();
  vertical_bearing_holes();
}
// file: x-end.scad
// PRUSA iteration3
// X end prototype
// GNU GPL v3
// Josef Průša <iam@josefprusa.cz> and contributors
// http://www.reprap.org/wiki/Prusa_Mendel
// http://prusamendel.org

use <bearing.scad>
use <polyholes.scad>
rod_distance=45;

module x_end_base()
{
    // Main block
    height=58;
    translate([-15,-9,height/2]) cube([17,39,height], center=true);

    // Bearing holder
    vertical_bearing_base();

    // Nut trap
    translate([0, -17-5, 0]) {
        difference() {
            // Hexagon
            cylinder(h=10.2, d=27, $fn=24);
            // Nut trap
            translate([0, 0, -0.5]) poly_cylinder(h=16, r=5.1, $fn=25);
            for (a=[0:90:269]) {
                rotate([0,0,a-90]) translate([(22/2)-(3.5/2)-1.2,0,-6]) cylinder(d=3.5, h=20, $fn=16);
            }
        }
    }
}

module x_end_holes()
{
    vertical_bearing_holes();

    // Belt hole
    translate([-1,0,0]) {

        // Stress relief
        translate([-5.5-10+1.5, -10-1, 30]) cube([20,1,28], center=true);
        difference() {
            translate([-5.5-10+1.5, -10, 30]) cube([10,46,28], center=true);

            // Nice edges
            translate([-5.5-10+1.5, -10, 30+23]) rotate([0, +45, 0]) cube([10, 46, 28], center=true);
            translate([-5.5-10+1.5, -10, 30+23]) rotate([0, -45, 0]) cube([10, 46, 28], center=true);
            translate([-5.5-10+1.5, -10, 30-23]) rotate([0, +45, 0]) cube([10, 46, 28], center=true);
            translate([-5.5-10+1.5, -10, 30-23]) rotate([0, -45, 0]) cube([10, 46, 28], center=true);
        }
    }

    // Bottom pushfit rod
    translate([-15, -41.5, 6]) rotate(a=[-90, 0, 0]) pushfit_rod(8.1, 50);

    // Top pushfit rod
    translate([-15, -41.5, rod_distance+6]) rotate(a=[-90, 0, 0]) pushfit_rod(8.1, 50);
}

module pushfit_rod(diameter,length)
{
    poly_cylinder(h=length, r=diameter/2);
    difference() {
        translate([0, -diameter/2.85, length/2]) rotate([0,0,45]) cube([diameter/2, diameter/2, length], center=true);
        translate([0, -diameter/4-diameter/2-0.4, length/2]) rotate([0,0,0]) cube([diameter, diameter/2, length], center=true);
    }
    // translate([0,-diameter/2-2,length/2]) cube([diameter,1,length], center=true);
}

// Final prototype
module x_end_plain()
{
    difference() {
        x_end_base();
        x_end_holes();
    }
}

x_end_plain();
// main file
// PRUSA iteration3
// X end motor
// GNU GPL v3
// Josef Průša <iam@josefprusa.cz> and contributors
// http://www.reprap.org/wiki/Prusa_Mendel
// http://prusamendel.org

use <x-end.scad>

module x_end_motor_holes()
{
  x_end_holes();

  // Position to place
  translate(v=[-1,32,30.25]) {
    // Belt hole
    translate(v=[-14,-11.5,0]) cube(size = [10,20,22], center = true);

    // Motor mounting holes
    for (i=[-1,1]) for (j=[-1,1]) {
      translate(v=[20,i*13,j*13]) rotate(a=[0,-90,0]) rotate(a=[0,0,90]) cylinder(h = 70, r=1.8, $fn=30);
      translate(v=[1,i*13,j*13]) rotate(a=[0,-90,0]) rotate(a=[0,0,90]) cylinder(h = 10, r=3.1, $fn=30);
    }

    // Material saving cutout
    translate(v=[-10,14,12]) cube(size = [60,42,42], center = true);

    // Material saving cutout
    translate(v=[-10,40,-30]) rotate(a=[45,0,0])  cube(size = [60,42,42], center = true);
    // Motor shaft cutout
    translate(v=[0,0,0]) rotate(a=[0,-90,0]) rotate(a=[0,0,90]) cylinder(h = 70, r=14, $fn=6);
  }
}

// Final part
module x_end_motor()
{
  difference() {
    union() {
      x_end_base();
      translate(v=[-15,31,26.5]) cube(size = [17,44,53], center = true);
    }
    x_end_motor_holes();
  }
}

// % translate([-23.57,32,30.25]) rotate(a=[0,90,0]) import("../inc/nema14.stl", convexity=3);
x_end_motor();
